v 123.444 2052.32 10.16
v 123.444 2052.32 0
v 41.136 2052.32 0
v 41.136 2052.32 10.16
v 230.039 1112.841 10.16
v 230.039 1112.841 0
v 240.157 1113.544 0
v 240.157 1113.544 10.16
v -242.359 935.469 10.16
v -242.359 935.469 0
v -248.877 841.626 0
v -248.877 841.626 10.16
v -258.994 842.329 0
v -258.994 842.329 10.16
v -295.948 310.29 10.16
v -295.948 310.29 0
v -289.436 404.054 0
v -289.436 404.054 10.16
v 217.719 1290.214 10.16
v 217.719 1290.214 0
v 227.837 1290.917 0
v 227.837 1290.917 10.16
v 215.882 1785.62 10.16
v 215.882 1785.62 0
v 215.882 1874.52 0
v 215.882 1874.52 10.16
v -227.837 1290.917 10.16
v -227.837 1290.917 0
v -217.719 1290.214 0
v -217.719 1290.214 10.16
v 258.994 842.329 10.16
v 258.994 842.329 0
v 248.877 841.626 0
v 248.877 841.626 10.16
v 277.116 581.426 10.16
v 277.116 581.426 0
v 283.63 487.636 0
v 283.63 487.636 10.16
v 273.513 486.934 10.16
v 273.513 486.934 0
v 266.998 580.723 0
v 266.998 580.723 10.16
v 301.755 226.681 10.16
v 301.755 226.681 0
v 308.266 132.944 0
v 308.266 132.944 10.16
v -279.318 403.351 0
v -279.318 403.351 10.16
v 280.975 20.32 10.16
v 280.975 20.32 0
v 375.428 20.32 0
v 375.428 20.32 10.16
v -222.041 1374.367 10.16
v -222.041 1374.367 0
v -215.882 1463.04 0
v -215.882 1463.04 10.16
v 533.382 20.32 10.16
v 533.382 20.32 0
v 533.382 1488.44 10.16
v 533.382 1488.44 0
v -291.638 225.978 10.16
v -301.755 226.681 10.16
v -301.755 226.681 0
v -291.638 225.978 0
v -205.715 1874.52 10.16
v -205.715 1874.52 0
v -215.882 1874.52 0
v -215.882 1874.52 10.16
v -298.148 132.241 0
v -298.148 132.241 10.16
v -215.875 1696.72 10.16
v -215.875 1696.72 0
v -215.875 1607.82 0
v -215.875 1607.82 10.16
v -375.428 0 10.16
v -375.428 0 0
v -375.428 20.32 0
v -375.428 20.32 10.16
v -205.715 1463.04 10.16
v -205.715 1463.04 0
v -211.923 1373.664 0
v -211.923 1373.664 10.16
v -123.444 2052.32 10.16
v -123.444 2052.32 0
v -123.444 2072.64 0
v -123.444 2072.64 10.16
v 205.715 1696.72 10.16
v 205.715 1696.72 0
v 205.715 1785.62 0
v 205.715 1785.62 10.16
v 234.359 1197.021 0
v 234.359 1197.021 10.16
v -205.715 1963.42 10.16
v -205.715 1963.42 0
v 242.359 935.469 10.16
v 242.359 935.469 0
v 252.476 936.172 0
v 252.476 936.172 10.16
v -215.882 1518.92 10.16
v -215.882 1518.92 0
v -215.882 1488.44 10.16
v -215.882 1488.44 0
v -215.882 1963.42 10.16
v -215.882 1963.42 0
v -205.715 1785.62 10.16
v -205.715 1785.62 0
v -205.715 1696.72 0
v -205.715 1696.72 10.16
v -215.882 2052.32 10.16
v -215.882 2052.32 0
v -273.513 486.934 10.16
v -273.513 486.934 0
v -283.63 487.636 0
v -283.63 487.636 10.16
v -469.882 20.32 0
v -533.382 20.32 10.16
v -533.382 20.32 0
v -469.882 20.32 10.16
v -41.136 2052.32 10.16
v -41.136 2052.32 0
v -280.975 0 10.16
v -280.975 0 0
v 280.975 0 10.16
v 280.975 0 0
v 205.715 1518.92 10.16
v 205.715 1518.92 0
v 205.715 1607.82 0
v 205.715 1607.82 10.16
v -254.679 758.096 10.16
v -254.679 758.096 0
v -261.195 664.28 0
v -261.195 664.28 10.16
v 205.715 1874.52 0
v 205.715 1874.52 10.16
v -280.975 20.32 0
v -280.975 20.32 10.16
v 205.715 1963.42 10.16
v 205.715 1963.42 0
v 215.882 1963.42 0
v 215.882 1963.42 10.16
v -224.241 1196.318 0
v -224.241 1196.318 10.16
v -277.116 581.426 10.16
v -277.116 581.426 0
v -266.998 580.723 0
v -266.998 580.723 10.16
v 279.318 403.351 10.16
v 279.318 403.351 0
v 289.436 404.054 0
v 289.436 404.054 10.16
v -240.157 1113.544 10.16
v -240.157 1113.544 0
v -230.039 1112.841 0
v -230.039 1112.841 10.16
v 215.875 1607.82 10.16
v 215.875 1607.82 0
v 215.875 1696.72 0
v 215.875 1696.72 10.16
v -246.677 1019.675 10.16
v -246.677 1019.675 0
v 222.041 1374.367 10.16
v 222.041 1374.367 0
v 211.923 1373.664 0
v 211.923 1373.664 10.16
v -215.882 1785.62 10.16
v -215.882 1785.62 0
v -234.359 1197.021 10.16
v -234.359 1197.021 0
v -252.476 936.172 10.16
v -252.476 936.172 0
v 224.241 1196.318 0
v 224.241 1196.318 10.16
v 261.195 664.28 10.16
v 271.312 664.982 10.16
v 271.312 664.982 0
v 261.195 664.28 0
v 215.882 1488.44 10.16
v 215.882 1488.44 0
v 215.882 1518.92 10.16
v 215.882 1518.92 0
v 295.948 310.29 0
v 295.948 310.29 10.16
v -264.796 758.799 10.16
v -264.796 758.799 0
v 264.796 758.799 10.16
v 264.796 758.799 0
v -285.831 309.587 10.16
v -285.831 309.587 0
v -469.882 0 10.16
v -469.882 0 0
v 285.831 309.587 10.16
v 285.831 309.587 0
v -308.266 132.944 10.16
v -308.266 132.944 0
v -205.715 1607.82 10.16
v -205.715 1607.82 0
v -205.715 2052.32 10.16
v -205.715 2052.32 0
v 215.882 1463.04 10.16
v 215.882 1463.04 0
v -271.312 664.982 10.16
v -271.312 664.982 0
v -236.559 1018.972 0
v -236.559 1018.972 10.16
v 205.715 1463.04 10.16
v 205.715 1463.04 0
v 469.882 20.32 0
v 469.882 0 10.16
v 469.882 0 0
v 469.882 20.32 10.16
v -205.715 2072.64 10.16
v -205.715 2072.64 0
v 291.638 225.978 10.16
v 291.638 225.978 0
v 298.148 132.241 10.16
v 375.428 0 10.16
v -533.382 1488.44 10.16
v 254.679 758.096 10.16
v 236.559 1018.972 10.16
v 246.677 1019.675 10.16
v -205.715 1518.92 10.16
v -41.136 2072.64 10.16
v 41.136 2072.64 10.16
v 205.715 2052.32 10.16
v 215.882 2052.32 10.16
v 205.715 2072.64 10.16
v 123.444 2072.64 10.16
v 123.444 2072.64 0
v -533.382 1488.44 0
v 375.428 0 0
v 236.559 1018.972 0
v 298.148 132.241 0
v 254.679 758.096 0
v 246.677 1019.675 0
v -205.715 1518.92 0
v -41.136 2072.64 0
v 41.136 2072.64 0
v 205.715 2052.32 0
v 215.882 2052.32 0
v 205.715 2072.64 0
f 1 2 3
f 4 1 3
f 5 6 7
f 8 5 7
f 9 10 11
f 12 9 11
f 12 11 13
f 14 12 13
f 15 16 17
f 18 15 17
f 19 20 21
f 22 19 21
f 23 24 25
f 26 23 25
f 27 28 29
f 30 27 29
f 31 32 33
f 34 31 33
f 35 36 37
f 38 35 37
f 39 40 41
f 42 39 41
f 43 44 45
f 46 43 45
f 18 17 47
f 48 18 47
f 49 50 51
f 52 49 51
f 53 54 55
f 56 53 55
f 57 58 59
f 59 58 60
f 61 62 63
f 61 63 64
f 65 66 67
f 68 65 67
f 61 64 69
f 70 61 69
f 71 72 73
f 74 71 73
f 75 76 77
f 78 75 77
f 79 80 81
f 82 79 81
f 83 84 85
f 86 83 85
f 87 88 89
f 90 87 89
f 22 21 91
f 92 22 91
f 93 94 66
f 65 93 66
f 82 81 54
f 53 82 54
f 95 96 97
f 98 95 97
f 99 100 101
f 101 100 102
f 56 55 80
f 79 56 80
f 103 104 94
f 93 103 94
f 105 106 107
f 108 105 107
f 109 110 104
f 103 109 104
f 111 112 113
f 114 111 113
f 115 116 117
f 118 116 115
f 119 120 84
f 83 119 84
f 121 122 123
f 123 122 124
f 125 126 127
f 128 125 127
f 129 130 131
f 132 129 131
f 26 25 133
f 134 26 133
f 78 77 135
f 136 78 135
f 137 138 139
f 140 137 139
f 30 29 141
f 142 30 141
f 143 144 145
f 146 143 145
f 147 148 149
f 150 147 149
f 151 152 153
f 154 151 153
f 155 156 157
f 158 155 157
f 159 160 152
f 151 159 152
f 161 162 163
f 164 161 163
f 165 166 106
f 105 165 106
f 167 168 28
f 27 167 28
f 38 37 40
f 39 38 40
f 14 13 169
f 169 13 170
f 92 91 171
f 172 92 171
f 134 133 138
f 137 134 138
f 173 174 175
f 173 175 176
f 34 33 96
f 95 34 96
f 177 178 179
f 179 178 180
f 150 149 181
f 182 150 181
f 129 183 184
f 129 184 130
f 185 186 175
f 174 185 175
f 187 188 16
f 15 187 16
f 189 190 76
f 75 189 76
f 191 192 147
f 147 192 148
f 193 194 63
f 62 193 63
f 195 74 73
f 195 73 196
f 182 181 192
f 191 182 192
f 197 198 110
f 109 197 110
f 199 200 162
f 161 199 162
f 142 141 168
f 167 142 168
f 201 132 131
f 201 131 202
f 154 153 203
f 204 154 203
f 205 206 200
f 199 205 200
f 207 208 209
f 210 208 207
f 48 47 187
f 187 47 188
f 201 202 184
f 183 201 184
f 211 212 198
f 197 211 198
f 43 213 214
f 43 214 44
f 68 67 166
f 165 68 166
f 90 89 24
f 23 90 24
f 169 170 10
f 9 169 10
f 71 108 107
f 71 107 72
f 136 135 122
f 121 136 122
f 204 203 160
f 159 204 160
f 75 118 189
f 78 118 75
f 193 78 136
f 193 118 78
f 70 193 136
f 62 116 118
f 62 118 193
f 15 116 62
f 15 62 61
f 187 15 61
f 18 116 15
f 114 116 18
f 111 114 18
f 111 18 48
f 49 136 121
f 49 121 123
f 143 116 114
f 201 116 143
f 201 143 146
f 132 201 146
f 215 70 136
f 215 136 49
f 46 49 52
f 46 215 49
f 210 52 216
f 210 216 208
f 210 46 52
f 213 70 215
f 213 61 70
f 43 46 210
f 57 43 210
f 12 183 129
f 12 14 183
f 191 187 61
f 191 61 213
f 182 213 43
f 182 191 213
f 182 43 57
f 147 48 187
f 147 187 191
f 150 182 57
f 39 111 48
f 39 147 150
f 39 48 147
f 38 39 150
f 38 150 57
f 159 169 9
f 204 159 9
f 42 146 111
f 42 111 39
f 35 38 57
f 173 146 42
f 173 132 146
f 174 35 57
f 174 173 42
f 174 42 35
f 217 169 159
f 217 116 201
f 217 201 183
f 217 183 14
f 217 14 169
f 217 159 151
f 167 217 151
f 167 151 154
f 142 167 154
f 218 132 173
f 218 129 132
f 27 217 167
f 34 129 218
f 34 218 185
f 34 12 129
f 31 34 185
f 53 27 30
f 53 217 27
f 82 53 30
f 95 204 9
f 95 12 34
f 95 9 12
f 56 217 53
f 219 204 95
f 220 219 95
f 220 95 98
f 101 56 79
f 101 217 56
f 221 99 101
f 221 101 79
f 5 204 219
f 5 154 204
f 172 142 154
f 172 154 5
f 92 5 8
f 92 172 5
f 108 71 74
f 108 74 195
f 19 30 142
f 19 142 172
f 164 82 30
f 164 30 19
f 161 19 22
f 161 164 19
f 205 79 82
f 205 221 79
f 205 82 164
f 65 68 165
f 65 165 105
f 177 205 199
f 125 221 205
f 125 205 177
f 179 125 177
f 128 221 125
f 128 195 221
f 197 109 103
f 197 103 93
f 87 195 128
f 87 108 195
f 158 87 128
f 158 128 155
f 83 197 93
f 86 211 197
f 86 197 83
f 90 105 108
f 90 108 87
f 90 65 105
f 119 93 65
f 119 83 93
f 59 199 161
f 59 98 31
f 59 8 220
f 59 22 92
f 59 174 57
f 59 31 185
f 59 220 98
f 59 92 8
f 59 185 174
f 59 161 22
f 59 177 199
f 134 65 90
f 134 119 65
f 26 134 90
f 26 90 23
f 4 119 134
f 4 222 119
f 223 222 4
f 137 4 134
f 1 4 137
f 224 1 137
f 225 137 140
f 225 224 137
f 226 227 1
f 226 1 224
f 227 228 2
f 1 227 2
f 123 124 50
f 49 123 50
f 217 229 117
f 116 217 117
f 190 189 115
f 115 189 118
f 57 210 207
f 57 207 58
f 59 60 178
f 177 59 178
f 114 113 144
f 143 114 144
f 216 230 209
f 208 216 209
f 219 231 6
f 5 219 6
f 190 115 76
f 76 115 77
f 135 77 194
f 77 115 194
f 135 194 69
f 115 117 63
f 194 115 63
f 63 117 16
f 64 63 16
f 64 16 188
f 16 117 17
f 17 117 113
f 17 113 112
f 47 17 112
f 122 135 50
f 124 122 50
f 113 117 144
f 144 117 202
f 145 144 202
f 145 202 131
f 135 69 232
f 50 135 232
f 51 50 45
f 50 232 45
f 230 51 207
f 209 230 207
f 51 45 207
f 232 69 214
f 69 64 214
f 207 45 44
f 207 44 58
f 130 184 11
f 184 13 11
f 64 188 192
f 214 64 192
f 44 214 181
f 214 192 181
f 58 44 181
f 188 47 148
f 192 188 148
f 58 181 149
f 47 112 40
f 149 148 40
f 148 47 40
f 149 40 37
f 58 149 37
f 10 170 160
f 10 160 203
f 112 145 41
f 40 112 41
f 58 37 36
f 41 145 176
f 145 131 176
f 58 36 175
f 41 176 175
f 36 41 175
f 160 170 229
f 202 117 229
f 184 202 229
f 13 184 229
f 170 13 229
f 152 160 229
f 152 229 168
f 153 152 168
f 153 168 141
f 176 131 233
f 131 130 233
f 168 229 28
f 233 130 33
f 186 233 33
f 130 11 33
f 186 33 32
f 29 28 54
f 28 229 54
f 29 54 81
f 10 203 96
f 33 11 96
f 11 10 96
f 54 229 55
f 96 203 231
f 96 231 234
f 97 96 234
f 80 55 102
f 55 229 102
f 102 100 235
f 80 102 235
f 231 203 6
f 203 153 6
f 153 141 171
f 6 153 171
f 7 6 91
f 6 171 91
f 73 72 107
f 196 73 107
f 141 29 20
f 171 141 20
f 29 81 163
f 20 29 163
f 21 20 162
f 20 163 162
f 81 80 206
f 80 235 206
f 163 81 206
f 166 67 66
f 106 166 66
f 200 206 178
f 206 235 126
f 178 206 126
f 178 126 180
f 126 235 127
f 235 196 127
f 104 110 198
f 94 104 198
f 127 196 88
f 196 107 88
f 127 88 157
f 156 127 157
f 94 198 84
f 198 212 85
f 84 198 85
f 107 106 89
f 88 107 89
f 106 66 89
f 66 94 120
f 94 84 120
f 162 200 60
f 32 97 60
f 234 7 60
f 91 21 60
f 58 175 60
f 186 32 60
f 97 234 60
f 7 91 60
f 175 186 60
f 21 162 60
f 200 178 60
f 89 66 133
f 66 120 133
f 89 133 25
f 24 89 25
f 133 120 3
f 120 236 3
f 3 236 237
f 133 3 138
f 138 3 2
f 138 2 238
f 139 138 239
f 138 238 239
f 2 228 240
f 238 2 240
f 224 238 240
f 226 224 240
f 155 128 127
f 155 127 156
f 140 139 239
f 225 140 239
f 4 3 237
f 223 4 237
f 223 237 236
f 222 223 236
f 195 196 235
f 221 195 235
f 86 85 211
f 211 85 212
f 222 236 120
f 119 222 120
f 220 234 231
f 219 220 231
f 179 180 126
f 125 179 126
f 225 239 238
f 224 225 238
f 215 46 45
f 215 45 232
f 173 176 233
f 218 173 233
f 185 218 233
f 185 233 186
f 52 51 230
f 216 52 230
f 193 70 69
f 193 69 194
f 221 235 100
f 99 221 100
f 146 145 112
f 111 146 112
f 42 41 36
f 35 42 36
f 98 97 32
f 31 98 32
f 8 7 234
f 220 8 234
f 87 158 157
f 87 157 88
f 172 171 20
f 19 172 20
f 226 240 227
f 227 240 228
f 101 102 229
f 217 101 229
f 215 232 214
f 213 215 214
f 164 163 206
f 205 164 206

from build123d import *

# Parameters (mm, degrees)
BOSS_EXTRUDE1_DEPTH = 10.16
SKETCH5_W           = 63.5
SKETCH5_H           = 20.32
CUT_EXTRUDE1_DEPTH  = 11.16


with BuildPart() as part:
    # Sketch1 → Boss-Extrude1 (new body)
    with BuildSketch(Plane.XY):
        Polygon((-123.444, 2072.64), (-205.715298803, 2072.64), (-205.715298803, 2052.32), (-215.881789204, 2052.32), (-215.881789204, 1963.42), (-205.715298803, 1963.42), (-205.715298803, 1874.52), (-215.881789204, 1874.52), (-215.881789204, 1785.62), (-205.715298803, 1785.62), (-205.715298803, 1696.72), (-215.875298803, 1696.72), (-215.875298803, 1607.82), (-205.715298803, 1607.82), (-205.715298803, 1518.92), (-215.881789204, 1518.92), (-215.881789204, 1488.440000035), (-533.381789204, 1488.440000035), (-533.381789204, 0), (-375.428294602, 0), (-375.428294602, 20.32), (-280.9748, 20.32), (-280.9748, 0), (280.9748, 0), (280.9748, 20.32), (375.428294602, 20.32), (375.428294602, 0), (533.381789204, 0), (533.381789204, 1488.440000035), (215.881789204, 1488.440000035), (215.881789204, 1518.92), (205.715298803, 1518.92), (205.715298803, 1607.82), (215.875298803, 1607.82), (215.875298803, 1696.72), (205.715298803, 1696.72), (205.715298803, 1785.62), (215.881789204, 1785.62), (215.881789204, 1874.52), (205.715298803, 1874.52), (205.715298803, 1963.42), (215.881789204, 1963.42), (215.881789204, 2052.32), (205.715298803, 2052.32), (205.715298803, 2072.64), (123.444, 2072.64), (123.444, 2052.32), (41.135649402, 2052.32), (41.135649402, 2072.64), (-41.135649402, 2072.64), (-41.135649402, 2052.32), (-123.444, 2052.32), align=None)
        Polygon((215.881789204, 1463.040000035), (222.040744894, 1374.366931824), (211.92306481, 1373.664189215), (205.715298803, 1463.040000035), align=None, mode=Mode.SUBTRACT)
        Polygon((-205.715298803, 1463.040000035), (-211.92306481, 1373.664189215), (-222.040744894, 1374.366931824), (-215.881789204, 1463.040000035), align=None, mode=Mode.SUBTRACT)
        Polygon((227.836927701, 1290.916856945), (234.358656272, 1197.020795404), (224.240976188, 1196.318052795), (217.719247617, 1290.214114336), align=None, mode=Mode.SUBTRACT)
        Polygon((-308.266124544, 132.94397688), (-301.755453134, 226.680843836), (-291.63777305, 225.978101227), (-298.14844446, 132.241234271), align=None, mode=Mode.SUBTRACT)
        Polygon((-289.435698895, 404.053512688), (-279.318018811, 403.350770078), (-285.830533081, 309.587370692), (-295.948213166, 310.290113301), align=None, mode=Mode.SUBTRACT)
        Polygon((-283.630301787, 487.636249721), (-277.115944656, 581.426181539), (-266.998264572, 580.72343893), (-273.512621703, 486.933507112), align=None, mode=Mode.SUBTRACT)
        Polygon((-264.796190418, 758.798850391), (-254.678510334, 758.096107781), (-261.194710324, 664.279643533), (-271.312390408, 664.982386142), align=None, mode=Mode.SUBTRACT)
        Polygon((-252.476436179, 936.171519242), (-242.358756095, 935.468776633), (-248.876798945, 841.625779953), (-258.99447903, 842.328522563), align=None, mode=Mode.SUBTRACT)
        Polygon((301.755453134, 226.680843836), (308.266124544, 132.94397688), (298.14844446, 132.241234271), (291.63777305, 225.978101227), align=None, mode=Mode.SUBTRACT)
        Polygon((279.318018811, 403.350770078), (289.435698895, 404.053512688), (295.948213166, 310.290113301), (285.830533081, 309.587370692), align=None, mode=Mode.SUBTRACT)
        Polygon((254.678510334, 758.096107781), (264.796190418, 758.798850391), (271.312390408, 664.982386142), (261.194710324, 664.279643533), align=None, mode=Mode.SUBTRACT)
        Polygon((242.358756095, 935.468776633), (252.476436179, 936.171519242), (258.99447903, 842.328522563), (248.876798945, 841.625779953), align=None, mode=Mode.SUBTRACT)
        Polygon((277.115944656, 581.426181539), (283.630301787, 487.636249721), (273.512621703, 486.933507112), (266.998264572, 580.72343893), align=None, mode=Mode.SUBTRACT)
        Polygon((-240.15668194, 1113.544188093), (-230.039001856, 1112.841445484), (-236.558887567, 1018.971916374), (-246.676567651, 1019.674658983), align=None, mode=Mode.SUBTRACT)
        Polygon((-227.836927701, 1290.916856945), (-217.719247617, 1290.214114336), (-224.240976188, 1196.318052795), (-234.358656272, 1197.020795404), align=None, mode=Mode.SUBTRACT)
        Polygon((230.039001856, 1112.841445484), (240.15668194, 1113.544188093), (246.676567651, 1019.674658983), (236.558887567, 1018.971916374), align=None, mode=Mode.SUBTRACT)
    extrude(amount=BOSS_EXTRUDE1_DEPTH)

    # Sketch5 → Cut-Extrude1 (cut, through all)
    with BuildSketch(Plane.XY.offset(10.16)):
        with Locations((-501.631789204, 10.16)):
            Rectangle(SKETCH5_W, SKETCH5_H)
        with Locations((501.631789204, 10.16)):
            Rectangle(SKETCH5_W, SKETCH5_H)
    extrude(amount=-CUT_EXTRUDE1_DEPTH, mode=Mode.SUBTRACT)


solid = part.part
